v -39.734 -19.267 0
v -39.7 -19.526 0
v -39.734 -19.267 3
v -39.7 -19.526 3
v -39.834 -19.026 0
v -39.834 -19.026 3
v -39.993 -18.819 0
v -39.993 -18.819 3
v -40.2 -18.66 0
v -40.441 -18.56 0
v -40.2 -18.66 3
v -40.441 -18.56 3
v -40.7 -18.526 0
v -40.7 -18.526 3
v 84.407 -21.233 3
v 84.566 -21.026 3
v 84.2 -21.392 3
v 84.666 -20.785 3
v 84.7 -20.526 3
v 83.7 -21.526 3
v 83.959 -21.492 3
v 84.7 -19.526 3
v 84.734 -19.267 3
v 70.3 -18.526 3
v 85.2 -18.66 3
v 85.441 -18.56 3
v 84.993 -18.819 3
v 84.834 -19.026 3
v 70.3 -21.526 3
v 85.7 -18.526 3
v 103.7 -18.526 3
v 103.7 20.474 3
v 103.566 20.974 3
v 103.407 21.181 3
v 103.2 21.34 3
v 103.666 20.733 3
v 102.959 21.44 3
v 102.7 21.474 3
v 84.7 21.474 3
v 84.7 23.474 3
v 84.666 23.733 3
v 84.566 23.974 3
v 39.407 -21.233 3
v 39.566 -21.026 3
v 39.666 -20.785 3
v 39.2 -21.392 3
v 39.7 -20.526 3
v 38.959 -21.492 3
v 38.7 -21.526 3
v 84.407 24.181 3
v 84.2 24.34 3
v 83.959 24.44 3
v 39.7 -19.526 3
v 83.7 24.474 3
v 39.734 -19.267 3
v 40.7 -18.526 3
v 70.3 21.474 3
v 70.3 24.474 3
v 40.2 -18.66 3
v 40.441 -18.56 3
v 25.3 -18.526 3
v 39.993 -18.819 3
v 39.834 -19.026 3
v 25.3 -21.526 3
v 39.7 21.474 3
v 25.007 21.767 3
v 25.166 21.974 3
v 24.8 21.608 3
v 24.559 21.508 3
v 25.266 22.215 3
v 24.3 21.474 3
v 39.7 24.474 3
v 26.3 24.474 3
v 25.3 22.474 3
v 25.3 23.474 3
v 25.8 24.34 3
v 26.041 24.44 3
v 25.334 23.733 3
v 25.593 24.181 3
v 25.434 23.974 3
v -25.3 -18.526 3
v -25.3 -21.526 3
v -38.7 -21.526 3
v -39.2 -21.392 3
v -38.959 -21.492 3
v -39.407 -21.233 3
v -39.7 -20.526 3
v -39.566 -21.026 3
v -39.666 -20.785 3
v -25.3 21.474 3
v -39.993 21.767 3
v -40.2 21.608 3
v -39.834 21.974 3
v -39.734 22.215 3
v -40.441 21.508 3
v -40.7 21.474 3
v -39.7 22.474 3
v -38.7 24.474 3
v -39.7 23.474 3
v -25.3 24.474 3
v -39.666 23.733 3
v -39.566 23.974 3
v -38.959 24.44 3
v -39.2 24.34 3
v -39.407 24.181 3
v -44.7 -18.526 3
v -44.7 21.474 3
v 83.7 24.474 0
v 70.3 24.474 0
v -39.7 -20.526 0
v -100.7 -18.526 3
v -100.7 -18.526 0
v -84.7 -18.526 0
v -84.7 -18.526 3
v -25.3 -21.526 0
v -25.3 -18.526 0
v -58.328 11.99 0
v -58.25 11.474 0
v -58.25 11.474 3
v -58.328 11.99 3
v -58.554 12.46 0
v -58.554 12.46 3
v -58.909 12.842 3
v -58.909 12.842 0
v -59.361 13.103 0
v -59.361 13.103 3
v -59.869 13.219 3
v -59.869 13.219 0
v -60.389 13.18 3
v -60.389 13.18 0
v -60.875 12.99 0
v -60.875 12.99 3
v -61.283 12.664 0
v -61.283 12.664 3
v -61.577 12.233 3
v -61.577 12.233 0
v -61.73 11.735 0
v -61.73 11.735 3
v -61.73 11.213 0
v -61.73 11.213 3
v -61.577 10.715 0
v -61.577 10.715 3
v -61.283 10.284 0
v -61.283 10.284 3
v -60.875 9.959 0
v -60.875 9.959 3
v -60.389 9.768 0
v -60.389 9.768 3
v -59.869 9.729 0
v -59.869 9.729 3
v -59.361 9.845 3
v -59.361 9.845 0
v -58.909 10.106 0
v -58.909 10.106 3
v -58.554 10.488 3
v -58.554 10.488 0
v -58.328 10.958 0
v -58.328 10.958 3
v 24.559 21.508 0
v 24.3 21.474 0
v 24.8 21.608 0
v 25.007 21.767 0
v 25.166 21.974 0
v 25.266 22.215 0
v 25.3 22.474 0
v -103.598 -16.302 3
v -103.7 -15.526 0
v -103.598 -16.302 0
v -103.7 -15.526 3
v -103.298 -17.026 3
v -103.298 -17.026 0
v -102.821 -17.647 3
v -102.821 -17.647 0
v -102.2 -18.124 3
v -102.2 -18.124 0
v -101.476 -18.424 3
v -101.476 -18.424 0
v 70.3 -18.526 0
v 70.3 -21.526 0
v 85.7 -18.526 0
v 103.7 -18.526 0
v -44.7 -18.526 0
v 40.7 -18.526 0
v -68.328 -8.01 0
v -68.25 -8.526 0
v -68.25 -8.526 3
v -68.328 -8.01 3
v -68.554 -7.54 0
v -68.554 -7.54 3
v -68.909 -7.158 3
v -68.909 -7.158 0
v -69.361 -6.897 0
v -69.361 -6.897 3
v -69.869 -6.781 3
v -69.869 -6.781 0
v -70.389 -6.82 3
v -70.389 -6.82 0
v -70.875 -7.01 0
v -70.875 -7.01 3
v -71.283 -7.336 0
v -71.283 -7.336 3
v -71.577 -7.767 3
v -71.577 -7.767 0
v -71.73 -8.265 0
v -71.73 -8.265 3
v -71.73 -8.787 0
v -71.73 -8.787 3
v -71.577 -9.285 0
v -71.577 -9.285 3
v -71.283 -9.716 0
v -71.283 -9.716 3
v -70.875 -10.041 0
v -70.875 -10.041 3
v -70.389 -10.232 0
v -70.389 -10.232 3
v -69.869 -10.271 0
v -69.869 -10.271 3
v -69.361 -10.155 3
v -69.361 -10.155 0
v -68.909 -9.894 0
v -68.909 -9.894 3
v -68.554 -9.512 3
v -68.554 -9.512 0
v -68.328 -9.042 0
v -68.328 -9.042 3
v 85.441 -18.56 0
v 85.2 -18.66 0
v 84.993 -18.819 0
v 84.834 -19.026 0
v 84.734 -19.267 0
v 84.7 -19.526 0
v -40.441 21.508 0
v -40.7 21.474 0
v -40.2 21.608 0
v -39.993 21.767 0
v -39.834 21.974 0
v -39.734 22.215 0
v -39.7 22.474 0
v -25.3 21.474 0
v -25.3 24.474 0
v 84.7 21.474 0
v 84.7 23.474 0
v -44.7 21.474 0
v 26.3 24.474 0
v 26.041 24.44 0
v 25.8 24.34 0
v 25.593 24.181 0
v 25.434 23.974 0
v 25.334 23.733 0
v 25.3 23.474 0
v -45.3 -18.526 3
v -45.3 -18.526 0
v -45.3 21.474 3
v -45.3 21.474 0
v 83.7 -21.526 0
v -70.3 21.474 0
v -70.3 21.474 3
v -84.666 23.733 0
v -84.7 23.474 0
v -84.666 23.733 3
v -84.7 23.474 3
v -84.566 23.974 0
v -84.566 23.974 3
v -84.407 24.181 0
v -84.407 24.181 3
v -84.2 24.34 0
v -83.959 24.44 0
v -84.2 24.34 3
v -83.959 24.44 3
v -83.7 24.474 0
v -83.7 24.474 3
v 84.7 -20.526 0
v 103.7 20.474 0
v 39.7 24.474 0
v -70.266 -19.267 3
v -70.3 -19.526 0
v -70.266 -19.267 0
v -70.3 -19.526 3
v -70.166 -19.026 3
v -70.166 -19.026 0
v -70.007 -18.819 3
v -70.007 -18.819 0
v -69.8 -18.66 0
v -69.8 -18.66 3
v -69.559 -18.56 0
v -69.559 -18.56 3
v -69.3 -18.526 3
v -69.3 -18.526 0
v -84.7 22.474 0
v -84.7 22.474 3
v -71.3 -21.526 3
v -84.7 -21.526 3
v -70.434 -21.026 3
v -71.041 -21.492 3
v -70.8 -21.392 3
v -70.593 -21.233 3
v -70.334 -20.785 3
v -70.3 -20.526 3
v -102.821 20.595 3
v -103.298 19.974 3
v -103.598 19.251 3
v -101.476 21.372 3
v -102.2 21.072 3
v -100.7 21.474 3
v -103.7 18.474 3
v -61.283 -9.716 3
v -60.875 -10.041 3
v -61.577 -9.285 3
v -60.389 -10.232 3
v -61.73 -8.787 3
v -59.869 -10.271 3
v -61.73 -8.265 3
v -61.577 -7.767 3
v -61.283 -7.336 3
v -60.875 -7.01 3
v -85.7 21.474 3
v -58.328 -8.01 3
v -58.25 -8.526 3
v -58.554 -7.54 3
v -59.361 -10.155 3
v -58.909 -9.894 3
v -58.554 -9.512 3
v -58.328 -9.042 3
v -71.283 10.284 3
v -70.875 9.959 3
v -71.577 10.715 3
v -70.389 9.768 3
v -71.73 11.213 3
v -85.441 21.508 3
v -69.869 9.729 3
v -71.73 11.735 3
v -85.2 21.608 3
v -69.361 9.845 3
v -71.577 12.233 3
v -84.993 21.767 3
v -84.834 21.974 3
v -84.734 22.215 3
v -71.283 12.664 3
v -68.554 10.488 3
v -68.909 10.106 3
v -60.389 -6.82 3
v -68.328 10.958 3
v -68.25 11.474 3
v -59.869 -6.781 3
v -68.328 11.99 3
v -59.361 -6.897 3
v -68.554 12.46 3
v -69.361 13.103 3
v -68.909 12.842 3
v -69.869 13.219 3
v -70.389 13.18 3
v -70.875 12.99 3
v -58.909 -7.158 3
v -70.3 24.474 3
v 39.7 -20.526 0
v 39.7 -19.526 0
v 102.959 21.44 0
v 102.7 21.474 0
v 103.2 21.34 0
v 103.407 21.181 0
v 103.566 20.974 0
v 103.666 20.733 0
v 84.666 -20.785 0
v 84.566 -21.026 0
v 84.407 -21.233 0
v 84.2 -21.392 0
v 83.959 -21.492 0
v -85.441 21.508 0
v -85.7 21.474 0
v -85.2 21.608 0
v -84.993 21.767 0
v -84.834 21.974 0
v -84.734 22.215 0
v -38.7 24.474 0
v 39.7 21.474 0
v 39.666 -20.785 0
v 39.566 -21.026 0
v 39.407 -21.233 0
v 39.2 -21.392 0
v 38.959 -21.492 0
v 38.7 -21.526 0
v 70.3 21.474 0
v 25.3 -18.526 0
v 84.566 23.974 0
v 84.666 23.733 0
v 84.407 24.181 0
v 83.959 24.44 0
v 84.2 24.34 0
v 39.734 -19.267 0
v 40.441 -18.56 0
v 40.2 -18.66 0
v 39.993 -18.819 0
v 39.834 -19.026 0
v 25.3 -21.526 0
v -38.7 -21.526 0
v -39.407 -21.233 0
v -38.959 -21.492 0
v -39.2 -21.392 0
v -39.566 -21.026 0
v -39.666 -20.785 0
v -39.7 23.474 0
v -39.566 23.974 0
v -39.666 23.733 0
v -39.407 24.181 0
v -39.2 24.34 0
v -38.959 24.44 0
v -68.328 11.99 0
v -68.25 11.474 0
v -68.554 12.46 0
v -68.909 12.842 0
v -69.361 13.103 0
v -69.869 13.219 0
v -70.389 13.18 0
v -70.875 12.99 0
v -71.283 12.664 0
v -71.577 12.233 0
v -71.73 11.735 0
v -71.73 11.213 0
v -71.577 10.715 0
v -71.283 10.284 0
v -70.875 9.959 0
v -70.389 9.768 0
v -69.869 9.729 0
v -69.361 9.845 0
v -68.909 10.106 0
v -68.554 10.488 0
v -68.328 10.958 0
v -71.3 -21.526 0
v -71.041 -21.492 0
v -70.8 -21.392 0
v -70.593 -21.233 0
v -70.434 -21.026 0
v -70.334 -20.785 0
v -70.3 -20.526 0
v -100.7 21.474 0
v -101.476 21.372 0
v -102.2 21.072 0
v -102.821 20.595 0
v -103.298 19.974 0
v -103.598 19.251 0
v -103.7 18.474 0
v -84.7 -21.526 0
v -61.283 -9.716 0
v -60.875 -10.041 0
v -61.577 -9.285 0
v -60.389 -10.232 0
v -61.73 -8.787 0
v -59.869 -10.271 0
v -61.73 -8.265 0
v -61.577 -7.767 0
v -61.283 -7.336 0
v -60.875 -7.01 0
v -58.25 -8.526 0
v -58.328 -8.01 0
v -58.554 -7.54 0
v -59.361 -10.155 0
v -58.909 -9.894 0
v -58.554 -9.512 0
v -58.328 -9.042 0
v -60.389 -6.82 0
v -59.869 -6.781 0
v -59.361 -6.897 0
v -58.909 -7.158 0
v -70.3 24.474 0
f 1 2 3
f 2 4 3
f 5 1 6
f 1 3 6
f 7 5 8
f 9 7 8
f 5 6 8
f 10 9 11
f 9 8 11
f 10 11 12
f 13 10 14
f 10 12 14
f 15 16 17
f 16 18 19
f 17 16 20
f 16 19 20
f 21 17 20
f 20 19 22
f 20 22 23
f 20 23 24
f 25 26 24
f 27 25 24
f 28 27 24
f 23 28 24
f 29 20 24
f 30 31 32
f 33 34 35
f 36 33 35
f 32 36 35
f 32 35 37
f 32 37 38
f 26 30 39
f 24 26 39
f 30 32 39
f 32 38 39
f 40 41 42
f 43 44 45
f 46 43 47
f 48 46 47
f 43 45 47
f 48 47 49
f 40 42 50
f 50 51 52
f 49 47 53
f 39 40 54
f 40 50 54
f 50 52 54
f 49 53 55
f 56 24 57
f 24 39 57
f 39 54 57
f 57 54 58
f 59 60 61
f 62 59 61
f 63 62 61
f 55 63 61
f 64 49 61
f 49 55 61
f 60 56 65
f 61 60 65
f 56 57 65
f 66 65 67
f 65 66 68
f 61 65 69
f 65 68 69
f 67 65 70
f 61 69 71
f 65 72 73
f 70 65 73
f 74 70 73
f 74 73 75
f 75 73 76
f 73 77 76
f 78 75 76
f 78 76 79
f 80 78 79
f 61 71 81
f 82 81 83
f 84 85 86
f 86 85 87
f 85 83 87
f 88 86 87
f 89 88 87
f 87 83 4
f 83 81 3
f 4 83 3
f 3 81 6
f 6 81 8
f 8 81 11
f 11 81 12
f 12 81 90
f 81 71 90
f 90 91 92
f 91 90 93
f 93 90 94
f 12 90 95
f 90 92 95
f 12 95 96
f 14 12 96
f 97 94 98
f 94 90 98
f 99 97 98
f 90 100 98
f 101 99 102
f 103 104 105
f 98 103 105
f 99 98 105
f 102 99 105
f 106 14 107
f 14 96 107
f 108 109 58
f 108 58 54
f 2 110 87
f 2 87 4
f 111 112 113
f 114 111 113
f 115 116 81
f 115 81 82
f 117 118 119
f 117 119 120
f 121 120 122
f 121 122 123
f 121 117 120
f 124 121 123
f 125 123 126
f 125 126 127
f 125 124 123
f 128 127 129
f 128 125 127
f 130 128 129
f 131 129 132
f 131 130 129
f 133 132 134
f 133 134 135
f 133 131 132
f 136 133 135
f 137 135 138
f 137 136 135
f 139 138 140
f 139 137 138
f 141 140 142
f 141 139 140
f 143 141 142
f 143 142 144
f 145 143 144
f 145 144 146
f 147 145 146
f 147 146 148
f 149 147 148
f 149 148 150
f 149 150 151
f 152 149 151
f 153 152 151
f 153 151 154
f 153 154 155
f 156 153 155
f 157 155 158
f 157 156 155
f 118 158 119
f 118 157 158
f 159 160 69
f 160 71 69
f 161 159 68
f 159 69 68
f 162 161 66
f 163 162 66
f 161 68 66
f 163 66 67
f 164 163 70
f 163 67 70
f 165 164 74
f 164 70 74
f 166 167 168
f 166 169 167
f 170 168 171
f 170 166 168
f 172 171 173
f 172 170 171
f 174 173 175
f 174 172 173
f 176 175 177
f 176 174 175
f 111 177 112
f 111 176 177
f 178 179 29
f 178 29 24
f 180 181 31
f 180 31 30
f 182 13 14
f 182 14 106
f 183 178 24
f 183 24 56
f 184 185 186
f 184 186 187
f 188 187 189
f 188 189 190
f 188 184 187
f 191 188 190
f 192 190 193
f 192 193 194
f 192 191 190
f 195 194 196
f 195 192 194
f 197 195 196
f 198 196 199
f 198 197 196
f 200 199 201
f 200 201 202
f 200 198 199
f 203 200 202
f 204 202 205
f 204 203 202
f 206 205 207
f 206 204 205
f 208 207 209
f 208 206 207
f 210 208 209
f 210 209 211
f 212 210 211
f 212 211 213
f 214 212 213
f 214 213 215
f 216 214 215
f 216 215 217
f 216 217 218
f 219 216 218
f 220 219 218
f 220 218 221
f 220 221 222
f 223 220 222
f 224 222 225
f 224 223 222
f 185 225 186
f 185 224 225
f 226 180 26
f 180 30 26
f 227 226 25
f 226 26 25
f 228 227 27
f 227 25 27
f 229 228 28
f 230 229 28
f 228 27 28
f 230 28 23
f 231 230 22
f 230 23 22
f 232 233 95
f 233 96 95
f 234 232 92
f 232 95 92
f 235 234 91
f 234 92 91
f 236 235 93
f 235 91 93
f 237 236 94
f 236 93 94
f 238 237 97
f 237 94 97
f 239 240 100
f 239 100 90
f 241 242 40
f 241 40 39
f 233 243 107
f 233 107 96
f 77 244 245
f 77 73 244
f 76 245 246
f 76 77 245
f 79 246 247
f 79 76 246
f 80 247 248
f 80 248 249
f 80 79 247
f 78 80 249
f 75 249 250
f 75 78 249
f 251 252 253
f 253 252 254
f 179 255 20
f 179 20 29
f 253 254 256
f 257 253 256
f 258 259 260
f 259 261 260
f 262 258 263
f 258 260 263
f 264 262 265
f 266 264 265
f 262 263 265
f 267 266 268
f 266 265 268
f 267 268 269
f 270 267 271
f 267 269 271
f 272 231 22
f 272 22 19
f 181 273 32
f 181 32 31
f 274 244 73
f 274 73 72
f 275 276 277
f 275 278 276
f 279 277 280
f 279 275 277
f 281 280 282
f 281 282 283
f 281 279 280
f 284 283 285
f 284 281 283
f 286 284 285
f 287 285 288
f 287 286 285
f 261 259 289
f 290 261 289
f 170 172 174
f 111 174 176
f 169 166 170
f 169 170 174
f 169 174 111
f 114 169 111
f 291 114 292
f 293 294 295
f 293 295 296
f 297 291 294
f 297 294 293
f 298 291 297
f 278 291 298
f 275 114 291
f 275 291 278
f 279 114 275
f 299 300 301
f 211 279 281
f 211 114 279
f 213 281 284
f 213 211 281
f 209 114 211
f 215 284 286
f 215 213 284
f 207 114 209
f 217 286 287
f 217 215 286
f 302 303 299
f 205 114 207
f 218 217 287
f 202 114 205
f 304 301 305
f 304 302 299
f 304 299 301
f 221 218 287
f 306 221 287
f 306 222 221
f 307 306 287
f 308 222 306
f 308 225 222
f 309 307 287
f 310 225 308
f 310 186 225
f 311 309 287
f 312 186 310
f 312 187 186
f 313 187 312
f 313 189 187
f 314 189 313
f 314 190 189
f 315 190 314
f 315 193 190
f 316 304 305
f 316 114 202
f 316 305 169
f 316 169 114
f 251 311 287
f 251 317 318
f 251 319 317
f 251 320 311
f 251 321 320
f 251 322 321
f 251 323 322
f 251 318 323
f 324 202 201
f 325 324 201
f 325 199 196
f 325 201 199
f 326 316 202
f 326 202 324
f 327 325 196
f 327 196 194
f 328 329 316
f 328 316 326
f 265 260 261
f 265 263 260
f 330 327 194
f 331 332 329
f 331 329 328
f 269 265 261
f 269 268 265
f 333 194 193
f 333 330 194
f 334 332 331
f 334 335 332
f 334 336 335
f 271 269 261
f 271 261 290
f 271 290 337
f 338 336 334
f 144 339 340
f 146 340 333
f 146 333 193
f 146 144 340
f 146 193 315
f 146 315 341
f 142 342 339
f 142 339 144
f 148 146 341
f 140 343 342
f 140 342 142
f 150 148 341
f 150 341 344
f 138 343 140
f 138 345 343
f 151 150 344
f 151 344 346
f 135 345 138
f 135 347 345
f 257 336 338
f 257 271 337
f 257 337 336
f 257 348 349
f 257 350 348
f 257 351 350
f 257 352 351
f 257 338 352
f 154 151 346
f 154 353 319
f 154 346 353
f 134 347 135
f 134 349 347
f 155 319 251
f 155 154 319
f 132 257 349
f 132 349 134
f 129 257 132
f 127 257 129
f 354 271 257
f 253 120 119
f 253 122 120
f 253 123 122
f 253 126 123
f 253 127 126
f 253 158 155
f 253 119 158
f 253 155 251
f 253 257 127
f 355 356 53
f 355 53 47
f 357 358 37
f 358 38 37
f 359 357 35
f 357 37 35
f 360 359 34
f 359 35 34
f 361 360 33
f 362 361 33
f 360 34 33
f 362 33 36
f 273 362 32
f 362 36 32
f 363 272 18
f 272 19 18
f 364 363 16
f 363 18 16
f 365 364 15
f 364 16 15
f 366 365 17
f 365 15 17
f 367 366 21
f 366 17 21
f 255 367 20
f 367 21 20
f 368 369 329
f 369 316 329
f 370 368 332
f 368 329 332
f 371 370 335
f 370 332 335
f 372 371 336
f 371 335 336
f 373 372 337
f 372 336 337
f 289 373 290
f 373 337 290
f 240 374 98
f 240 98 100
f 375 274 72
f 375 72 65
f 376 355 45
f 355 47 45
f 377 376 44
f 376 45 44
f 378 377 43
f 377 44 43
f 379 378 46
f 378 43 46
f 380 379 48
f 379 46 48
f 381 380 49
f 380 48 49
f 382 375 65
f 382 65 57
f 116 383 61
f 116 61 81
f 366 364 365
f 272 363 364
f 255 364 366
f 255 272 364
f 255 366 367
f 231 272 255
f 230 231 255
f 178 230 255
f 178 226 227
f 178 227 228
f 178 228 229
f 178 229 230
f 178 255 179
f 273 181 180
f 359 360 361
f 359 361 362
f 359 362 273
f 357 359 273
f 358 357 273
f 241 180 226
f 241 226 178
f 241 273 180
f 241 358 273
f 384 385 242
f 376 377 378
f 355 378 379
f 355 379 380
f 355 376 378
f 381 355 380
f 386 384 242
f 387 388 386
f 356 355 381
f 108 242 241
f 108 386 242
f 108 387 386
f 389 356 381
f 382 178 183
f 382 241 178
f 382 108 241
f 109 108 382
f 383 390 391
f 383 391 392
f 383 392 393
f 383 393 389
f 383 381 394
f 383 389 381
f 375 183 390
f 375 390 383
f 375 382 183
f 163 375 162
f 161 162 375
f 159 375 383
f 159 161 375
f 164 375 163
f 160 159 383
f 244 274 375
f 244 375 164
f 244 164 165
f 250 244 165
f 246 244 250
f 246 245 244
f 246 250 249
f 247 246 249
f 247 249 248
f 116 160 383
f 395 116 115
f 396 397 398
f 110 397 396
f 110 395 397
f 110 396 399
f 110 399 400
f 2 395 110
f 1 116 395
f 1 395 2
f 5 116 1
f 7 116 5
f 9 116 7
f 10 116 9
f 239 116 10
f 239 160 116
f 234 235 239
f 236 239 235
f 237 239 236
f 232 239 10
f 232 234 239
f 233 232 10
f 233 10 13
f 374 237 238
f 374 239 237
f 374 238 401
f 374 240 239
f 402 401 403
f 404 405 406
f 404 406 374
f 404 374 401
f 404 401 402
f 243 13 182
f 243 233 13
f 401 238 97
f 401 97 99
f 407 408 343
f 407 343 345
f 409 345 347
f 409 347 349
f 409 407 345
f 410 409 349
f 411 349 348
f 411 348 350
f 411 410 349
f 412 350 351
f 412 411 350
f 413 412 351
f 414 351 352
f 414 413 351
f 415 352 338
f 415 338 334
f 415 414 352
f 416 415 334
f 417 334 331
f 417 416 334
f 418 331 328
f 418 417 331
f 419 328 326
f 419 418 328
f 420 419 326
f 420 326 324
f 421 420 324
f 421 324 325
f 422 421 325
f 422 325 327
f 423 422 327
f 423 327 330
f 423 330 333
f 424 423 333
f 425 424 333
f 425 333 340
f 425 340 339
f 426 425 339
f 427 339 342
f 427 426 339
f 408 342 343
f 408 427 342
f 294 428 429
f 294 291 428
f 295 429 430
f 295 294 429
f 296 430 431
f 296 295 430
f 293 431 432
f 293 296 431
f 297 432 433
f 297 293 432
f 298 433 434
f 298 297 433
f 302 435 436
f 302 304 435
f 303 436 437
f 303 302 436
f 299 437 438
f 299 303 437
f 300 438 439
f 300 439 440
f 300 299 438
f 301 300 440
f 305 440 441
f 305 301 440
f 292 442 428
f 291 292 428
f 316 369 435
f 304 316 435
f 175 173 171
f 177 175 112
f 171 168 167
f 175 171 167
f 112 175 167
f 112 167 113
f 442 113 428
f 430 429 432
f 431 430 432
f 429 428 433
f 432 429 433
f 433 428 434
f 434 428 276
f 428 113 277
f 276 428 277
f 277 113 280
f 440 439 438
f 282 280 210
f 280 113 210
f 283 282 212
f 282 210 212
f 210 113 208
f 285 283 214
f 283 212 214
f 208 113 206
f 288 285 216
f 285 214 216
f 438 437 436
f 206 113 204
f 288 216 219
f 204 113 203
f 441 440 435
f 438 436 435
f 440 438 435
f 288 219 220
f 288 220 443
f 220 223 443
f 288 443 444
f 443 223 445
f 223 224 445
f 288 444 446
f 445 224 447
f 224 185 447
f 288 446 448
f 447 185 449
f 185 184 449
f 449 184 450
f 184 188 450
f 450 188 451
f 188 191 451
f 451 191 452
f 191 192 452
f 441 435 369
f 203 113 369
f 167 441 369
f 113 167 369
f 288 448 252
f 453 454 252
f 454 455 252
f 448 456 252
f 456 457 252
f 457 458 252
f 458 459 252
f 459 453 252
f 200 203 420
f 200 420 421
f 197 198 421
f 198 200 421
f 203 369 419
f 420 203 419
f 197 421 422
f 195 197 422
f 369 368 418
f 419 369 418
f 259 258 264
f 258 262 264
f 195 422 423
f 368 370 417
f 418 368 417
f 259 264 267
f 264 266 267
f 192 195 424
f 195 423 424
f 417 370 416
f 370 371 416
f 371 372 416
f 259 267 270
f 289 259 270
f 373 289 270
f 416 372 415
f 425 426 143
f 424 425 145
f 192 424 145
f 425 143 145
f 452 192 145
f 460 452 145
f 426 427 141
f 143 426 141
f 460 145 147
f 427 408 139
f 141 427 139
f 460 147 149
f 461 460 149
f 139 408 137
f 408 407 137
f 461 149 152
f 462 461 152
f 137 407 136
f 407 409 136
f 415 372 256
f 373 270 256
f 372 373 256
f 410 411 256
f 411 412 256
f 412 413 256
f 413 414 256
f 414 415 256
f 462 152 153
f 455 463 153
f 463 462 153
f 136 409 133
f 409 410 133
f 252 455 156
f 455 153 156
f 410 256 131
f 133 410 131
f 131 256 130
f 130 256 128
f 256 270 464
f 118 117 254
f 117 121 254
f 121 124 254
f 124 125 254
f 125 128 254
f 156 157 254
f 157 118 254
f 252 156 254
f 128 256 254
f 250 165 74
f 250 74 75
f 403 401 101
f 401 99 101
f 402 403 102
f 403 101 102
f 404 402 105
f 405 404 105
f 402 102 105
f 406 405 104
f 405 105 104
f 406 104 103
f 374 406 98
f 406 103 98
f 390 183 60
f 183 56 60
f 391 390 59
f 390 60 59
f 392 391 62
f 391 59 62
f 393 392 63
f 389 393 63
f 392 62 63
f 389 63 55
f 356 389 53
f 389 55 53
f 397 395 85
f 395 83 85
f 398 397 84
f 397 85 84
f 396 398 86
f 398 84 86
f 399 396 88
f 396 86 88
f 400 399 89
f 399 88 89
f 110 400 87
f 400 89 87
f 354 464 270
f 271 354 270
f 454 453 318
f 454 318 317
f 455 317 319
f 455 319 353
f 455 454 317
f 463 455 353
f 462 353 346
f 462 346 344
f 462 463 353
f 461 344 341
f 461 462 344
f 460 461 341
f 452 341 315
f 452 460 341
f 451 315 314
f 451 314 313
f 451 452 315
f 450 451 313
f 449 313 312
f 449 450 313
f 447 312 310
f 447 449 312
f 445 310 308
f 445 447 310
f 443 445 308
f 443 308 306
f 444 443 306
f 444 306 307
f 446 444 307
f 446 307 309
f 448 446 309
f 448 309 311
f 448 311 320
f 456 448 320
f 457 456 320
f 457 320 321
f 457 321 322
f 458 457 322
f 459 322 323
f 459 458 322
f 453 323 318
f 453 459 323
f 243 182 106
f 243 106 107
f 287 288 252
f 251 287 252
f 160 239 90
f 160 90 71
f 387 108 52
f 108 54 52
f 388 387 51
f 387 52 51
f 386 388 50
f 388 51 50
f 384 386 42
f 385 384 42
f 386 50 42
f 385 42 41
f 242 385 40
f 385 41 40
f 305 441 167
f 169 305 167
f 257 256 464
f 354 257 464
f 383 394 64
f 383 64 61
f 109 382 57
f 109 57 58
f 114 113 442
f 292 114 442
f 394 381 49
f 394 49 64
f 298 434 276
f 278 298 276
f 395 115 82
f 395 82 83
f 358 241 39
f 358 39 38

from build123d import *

# Parameters (mm, degrees)
SKETCH_R    = 1.75
PAD_DEPTH   = 3
FILLET_R    = 1
FILLET001_R = 3


with BuildPart() as part:
    # Sketch → Pad (new body)
    with BuildSketch(Plane.XY):
        Polygon((25.3, 24.474048), (39.7, 24.474048), (39.7, 21.474048), (70.3, 21.474048), (70.3, 24.474048), (84.7, 24.474048), (84.7, 21.474048), (103.7, 21.474048), (103.7, -18.525952), (84.7, -18.525952), (84.7, -21.525952), (70.3, -21.525952), (70.3, -18.525952), (39.7, -18.525952), (39.7, -21.525952), (25.3, -21.525952), (25.3, -18.525952), (-25.3, -18.525952), (-25.3, -21.525952), (-39.7, -21.525952), (-39.7, -18.525952), (-44.7, -18.525952), (-44.7, 21.474048), (-39.7, 21.474048), (-39.7, 24.474048), (-25.3, 24.474048), (-25.3, 21.474048), (25.3, 21.474048), align=None)
        Polygon((-103.7, 21.474047), (-103.7, -18.525953), (-84.7, -18.525953), (-84.7, -21.525953), (-70.3, -21.525953), (-70.3, -18.525953), (-45.3, -18.525953), (-45.3, 21.474048), (-70.3, 21.474048), (-70.3, 24.474048), (-84.7, 24.474048), (-84.7, 21.474047), align=None)
        with Locations((-70, 11.474047)):
            Circle(SKETCH_R, mode=Mode.SUBTRACT)
        with Locations((-70, -8.525953)):
            Circle(SKETCH_R, mode=Mode.SUBTRACT)
        with Locations((-60, -8.525953)):
            Circle(SKETCH_R, mode=Mode.SUBTRACT)
        with Locations((-60, 11.474047)):
            Circle(SKETCH_R, mode=Mode.SUBTRACT)
    extrude(amount=PAD_DEPTH)

    # Fillet
    fillet_edges = [part.edges().sort_by_distance(p)[0] for p in [
        (103.7, 21.474048, 1.5),
        (84.7, 24.474048, 1.5),
        (25.3, 24.474048, 1.5),
        (25.3, 21.474048, 1.5),
        (-39.7, 24.474048, 1.5),
        (-39.7, 21.474048, 1.5),
        (-39.7, -18.525952, 1.5),
        (-39.7, -21.525952, 1.5),
        (39.7, -21.525952, 1.5),
        (39.7, -18.525952, 1.5),
        (84.7, -21.525952, 1.5),
        (84.7, -18.525952, 1.5),
        (-70.3, -18.525953, 1.5),
        (-70.3, -21.525953, 1.5),
        (-84.7, 21.474047, 1.5),
        (-84.7, 24.474048, 1.5),
    ]]
    fillet(fillet_edges, radius=FILLET_R)

    # Fillet001
    fillet001_edges = [part.edges().sort_by_distance(p)[0] for p in [
        (-38.7, 24.474048, 1.5),
        (-39.7, 23.474048, 1.5),
        (-103.7, -18.525953, 1.5),
        (-103.7, 21.474047, 1.5),
    ]]
    fillet(fillet001_edges, radius=FILLET001_R)


solid = part.part
